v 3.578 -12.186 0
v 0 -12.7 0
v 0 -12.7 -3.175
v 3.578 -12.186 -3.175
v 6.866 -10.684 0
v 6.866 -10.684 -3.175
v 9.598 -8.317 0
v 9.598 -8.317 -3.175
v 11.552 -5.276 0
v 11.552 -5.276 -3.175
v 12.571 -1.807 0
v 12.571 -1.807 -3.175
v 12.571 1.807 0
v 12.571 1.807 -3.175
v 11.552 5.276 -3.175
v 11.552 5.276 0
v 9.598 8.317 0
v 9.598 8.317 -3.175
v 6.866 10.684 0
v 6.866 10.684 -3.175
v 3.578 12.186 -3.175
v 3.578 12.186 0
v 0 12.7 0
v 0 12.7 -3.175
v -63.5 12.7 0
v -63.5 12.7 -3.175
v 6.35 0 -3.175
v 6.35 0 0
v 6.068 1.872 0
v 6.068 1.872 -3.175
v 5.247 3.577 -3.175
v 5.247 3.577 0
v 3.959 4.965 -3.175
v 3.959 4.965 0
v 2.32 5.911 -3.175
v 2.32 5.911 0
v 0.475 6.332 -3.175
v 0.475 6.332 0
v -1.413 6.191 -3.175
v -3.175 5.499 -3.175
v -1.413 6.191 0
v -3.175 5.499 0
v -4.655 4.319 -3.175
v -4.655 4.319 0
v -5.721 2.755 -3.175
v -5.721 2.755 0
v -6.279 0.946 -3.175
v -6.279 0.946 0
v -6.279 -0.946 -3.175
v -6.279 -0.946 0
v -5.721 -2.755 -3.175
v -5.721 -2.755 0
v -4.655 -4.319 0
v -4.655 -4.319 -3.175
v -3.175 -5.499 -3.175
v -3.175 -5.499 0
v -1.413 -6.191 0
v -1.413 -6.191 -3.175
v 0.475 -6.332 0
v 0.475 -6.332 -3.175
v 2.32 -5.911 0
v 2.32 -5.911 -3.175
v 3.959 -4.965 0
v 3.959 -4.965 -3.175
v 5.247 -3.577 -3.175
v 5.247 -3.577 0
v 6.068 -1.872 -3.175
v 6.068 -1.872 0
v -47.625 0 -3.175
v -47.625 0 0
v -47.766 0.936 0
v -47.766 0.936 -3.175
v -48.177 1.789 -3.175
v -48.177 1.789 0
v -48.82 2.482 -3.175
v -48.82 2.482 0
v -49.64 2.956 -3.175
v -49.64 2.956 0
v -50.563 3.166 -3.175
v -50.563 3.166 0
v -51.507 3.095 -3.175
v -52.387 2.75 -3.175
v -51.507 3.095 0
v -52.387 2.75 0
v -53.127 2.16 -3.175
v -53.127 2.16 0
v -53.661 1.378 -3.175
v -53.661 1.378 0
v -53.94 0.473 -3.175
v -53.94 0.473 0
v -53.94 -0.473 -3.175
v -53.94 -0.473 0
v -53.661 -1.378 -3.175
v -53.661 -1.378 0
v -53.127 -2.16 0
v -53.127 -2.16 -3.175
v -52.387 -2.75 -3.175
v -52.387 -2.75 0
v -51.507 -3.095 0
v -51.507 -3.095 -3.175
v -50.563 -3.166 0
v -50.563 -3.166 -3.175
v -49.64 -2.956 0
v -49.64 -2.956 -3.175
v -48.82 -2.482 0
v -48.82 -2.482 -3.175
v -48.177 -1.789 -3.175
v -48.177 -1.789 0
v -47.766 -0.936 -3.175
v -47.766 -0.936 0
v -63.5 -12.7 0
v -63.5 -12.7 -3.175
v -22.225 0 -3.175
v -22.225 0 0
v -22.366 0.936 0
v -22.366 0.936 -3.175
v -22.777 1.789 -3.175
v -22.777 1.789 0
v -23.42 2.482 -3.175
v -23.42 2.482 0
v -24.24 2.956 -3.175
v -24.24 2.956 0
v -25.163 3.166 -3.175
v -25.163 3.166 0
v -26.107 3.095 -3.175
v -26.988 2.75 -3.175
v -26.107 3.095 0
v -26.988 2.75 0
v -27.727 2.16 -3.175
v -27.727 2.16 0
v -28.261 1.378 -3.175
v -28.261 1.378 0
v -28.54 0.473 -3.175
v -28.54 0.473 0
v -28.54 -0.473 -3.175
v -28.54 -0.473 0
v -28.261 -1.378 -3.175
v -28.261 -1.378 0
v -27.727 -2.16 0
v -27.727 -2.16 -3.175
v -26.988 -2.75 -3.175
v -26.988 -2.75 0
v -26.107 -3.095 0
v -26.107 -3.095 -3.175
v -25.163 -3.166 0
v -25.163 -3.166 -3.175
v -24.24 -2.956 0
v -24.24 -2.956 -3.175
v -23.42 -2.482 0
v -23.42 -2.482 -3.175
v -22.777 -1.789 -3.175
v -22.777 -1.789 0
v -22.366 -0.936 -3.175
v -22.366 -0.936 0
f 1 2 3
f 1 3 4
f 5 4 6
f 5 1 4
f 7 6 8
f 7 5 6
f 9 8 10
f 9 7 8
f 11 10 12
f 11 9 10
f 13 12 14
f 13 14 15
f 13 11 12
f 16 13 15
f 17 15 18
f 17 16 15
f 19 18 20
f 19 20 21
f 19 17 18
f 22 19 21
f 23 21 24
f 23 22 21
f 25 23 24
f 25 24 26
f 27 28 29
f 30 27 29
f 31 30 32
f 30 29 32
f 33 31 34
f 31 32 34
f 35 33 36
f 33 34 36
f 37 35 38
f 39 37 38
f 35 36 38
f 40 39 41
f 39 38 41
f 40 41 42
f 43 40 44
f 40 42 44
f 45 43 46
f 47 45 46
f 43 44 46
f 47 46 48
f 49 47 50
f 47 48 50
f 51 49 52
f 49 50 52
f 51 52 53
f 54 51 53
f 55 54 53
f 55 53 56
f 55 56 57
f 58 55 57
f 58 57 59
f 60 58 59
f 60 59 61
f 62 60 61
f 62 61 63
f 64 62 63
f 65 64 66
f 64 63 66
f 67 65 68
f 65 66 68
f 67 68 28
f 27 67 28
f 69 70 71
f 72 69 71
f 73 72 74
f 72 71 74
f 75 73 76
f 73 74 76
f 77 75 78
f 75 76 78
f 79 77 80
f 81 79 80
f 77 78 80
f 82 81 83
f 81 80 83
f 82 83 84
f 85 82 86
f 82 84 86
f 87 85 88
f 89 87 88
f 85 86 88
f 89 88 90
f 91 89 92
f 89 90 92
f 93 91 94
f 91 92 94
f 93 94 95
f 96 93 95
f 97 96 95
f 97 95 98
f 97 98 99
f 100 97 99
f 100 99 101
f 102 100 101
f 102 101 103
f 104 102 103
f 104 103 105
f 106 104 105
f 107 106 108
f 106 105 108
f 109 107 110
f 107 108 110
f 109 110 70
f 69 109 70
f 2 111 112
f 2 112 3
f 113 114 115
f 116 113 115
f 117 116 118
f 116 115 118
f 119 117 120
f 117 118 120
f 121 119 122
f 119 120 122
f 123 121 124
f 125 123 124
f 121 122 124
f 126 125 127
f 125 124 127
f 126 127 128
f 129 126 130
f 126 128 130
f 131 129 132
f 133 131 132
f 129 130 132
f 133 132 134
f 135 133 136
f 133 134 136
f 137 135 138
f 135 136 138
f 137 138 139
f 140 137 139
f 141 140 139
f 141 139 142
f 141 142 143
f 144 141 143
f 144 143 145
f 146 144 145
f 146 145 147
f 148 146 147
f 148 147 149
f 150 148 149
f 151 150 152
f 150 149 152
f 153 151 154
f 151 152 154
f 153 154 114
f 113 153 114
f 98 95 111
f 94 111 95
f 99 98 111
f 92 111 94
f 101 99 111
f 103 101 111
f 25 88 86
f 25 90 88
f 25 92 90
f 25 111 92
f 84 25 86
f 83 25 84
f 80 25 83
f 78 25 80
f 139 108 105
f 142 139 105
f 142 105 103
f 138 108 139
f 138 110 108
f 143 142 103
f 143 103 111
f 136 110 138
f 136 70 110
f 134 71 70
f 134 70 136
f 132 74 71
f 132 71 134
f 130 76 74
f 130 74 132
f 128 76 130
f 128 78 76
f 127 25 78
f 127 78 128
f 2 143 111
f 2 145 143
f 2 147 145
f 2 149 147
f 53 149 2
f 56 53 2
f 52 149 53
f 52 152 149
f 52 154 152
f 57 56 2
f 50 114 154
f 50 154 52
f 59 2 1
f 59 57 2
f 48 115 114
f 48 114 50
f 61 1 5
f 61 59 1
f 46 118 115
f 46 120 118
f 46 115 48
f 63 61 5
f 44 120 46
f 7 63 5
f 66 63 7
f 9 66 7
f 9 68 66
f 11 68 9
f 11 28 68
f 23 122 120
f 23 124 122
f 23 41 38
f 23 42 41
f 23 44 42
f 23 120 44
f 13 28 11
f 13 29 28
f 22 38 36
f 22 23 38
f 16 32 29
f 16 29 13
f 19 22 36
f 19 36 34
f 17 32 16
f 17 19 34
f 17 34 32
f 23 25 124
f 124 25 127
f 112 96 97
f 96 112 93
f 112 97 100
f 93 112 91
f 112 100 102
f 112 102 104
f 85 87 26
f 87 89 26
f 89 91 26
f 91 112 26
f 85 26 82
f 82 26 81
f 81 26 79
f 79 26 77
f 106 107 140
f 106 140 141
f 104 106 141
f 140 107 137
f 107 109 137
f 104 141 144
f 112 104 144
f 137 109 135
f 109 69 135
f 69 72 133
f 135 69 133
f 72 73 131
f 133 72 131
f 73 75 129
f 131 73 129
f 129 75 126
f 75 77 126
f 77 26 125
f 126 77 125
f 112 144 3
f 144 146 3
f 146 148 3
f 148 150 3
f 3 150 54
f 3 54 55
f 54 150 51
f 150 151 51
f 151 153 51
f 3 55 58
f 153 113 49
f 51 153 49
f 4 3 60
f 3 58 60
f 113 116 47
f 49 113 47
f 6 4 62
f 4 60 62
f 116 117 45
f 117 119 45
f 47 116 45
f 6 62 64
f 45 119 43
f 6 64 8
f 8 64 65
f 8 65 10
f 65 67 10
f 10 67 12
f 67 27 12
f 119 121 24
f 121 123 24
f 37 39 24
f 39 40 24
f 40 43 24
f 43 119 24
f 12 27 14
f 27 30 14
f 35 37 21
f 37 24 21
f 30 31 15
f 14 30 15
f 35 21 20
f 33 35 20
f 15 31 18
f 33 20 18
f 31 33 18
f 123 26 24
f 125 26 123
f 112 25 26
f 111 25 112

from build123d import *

# Parameters (mm, degrees)
SKETCH1_R          = 6.35
SKETCH1_R_2        = 3.175
BASE_FLANGE1_DEPTH = 3.175


# Sheet-metal steps are written as plain solids
with BuildPart() as part:
    # Sketch1 → Base-Flange1 (new body)
    with BuildSketch(Plane.XY):
        with BuildLine():
            Line((0, 12.7), (-63.5, 12.7))
            Line((-63.5, 12.7), (-63.5, -12.7))
            Line((-63.5, -12.7), (0, -12.7))
            ThreePointArc((0, -12.7), (12.7, 0), (0, 12.7))
        make_face()
        Circle(SKETCH1_R, mode=Mode.SUBTRACT)
        with Locations((-50.8, 0)):
            Circle(SKETCH1_R_2, mode=Mode.SUBTRACT)
        with Locations((-25.4, 0)):
            Circle(SKETCH1_R_2, mode=Mode.SUBTRACT)
    extrude(amount=-BASE_FLANGE1_DEPTH)


solid = part.part
